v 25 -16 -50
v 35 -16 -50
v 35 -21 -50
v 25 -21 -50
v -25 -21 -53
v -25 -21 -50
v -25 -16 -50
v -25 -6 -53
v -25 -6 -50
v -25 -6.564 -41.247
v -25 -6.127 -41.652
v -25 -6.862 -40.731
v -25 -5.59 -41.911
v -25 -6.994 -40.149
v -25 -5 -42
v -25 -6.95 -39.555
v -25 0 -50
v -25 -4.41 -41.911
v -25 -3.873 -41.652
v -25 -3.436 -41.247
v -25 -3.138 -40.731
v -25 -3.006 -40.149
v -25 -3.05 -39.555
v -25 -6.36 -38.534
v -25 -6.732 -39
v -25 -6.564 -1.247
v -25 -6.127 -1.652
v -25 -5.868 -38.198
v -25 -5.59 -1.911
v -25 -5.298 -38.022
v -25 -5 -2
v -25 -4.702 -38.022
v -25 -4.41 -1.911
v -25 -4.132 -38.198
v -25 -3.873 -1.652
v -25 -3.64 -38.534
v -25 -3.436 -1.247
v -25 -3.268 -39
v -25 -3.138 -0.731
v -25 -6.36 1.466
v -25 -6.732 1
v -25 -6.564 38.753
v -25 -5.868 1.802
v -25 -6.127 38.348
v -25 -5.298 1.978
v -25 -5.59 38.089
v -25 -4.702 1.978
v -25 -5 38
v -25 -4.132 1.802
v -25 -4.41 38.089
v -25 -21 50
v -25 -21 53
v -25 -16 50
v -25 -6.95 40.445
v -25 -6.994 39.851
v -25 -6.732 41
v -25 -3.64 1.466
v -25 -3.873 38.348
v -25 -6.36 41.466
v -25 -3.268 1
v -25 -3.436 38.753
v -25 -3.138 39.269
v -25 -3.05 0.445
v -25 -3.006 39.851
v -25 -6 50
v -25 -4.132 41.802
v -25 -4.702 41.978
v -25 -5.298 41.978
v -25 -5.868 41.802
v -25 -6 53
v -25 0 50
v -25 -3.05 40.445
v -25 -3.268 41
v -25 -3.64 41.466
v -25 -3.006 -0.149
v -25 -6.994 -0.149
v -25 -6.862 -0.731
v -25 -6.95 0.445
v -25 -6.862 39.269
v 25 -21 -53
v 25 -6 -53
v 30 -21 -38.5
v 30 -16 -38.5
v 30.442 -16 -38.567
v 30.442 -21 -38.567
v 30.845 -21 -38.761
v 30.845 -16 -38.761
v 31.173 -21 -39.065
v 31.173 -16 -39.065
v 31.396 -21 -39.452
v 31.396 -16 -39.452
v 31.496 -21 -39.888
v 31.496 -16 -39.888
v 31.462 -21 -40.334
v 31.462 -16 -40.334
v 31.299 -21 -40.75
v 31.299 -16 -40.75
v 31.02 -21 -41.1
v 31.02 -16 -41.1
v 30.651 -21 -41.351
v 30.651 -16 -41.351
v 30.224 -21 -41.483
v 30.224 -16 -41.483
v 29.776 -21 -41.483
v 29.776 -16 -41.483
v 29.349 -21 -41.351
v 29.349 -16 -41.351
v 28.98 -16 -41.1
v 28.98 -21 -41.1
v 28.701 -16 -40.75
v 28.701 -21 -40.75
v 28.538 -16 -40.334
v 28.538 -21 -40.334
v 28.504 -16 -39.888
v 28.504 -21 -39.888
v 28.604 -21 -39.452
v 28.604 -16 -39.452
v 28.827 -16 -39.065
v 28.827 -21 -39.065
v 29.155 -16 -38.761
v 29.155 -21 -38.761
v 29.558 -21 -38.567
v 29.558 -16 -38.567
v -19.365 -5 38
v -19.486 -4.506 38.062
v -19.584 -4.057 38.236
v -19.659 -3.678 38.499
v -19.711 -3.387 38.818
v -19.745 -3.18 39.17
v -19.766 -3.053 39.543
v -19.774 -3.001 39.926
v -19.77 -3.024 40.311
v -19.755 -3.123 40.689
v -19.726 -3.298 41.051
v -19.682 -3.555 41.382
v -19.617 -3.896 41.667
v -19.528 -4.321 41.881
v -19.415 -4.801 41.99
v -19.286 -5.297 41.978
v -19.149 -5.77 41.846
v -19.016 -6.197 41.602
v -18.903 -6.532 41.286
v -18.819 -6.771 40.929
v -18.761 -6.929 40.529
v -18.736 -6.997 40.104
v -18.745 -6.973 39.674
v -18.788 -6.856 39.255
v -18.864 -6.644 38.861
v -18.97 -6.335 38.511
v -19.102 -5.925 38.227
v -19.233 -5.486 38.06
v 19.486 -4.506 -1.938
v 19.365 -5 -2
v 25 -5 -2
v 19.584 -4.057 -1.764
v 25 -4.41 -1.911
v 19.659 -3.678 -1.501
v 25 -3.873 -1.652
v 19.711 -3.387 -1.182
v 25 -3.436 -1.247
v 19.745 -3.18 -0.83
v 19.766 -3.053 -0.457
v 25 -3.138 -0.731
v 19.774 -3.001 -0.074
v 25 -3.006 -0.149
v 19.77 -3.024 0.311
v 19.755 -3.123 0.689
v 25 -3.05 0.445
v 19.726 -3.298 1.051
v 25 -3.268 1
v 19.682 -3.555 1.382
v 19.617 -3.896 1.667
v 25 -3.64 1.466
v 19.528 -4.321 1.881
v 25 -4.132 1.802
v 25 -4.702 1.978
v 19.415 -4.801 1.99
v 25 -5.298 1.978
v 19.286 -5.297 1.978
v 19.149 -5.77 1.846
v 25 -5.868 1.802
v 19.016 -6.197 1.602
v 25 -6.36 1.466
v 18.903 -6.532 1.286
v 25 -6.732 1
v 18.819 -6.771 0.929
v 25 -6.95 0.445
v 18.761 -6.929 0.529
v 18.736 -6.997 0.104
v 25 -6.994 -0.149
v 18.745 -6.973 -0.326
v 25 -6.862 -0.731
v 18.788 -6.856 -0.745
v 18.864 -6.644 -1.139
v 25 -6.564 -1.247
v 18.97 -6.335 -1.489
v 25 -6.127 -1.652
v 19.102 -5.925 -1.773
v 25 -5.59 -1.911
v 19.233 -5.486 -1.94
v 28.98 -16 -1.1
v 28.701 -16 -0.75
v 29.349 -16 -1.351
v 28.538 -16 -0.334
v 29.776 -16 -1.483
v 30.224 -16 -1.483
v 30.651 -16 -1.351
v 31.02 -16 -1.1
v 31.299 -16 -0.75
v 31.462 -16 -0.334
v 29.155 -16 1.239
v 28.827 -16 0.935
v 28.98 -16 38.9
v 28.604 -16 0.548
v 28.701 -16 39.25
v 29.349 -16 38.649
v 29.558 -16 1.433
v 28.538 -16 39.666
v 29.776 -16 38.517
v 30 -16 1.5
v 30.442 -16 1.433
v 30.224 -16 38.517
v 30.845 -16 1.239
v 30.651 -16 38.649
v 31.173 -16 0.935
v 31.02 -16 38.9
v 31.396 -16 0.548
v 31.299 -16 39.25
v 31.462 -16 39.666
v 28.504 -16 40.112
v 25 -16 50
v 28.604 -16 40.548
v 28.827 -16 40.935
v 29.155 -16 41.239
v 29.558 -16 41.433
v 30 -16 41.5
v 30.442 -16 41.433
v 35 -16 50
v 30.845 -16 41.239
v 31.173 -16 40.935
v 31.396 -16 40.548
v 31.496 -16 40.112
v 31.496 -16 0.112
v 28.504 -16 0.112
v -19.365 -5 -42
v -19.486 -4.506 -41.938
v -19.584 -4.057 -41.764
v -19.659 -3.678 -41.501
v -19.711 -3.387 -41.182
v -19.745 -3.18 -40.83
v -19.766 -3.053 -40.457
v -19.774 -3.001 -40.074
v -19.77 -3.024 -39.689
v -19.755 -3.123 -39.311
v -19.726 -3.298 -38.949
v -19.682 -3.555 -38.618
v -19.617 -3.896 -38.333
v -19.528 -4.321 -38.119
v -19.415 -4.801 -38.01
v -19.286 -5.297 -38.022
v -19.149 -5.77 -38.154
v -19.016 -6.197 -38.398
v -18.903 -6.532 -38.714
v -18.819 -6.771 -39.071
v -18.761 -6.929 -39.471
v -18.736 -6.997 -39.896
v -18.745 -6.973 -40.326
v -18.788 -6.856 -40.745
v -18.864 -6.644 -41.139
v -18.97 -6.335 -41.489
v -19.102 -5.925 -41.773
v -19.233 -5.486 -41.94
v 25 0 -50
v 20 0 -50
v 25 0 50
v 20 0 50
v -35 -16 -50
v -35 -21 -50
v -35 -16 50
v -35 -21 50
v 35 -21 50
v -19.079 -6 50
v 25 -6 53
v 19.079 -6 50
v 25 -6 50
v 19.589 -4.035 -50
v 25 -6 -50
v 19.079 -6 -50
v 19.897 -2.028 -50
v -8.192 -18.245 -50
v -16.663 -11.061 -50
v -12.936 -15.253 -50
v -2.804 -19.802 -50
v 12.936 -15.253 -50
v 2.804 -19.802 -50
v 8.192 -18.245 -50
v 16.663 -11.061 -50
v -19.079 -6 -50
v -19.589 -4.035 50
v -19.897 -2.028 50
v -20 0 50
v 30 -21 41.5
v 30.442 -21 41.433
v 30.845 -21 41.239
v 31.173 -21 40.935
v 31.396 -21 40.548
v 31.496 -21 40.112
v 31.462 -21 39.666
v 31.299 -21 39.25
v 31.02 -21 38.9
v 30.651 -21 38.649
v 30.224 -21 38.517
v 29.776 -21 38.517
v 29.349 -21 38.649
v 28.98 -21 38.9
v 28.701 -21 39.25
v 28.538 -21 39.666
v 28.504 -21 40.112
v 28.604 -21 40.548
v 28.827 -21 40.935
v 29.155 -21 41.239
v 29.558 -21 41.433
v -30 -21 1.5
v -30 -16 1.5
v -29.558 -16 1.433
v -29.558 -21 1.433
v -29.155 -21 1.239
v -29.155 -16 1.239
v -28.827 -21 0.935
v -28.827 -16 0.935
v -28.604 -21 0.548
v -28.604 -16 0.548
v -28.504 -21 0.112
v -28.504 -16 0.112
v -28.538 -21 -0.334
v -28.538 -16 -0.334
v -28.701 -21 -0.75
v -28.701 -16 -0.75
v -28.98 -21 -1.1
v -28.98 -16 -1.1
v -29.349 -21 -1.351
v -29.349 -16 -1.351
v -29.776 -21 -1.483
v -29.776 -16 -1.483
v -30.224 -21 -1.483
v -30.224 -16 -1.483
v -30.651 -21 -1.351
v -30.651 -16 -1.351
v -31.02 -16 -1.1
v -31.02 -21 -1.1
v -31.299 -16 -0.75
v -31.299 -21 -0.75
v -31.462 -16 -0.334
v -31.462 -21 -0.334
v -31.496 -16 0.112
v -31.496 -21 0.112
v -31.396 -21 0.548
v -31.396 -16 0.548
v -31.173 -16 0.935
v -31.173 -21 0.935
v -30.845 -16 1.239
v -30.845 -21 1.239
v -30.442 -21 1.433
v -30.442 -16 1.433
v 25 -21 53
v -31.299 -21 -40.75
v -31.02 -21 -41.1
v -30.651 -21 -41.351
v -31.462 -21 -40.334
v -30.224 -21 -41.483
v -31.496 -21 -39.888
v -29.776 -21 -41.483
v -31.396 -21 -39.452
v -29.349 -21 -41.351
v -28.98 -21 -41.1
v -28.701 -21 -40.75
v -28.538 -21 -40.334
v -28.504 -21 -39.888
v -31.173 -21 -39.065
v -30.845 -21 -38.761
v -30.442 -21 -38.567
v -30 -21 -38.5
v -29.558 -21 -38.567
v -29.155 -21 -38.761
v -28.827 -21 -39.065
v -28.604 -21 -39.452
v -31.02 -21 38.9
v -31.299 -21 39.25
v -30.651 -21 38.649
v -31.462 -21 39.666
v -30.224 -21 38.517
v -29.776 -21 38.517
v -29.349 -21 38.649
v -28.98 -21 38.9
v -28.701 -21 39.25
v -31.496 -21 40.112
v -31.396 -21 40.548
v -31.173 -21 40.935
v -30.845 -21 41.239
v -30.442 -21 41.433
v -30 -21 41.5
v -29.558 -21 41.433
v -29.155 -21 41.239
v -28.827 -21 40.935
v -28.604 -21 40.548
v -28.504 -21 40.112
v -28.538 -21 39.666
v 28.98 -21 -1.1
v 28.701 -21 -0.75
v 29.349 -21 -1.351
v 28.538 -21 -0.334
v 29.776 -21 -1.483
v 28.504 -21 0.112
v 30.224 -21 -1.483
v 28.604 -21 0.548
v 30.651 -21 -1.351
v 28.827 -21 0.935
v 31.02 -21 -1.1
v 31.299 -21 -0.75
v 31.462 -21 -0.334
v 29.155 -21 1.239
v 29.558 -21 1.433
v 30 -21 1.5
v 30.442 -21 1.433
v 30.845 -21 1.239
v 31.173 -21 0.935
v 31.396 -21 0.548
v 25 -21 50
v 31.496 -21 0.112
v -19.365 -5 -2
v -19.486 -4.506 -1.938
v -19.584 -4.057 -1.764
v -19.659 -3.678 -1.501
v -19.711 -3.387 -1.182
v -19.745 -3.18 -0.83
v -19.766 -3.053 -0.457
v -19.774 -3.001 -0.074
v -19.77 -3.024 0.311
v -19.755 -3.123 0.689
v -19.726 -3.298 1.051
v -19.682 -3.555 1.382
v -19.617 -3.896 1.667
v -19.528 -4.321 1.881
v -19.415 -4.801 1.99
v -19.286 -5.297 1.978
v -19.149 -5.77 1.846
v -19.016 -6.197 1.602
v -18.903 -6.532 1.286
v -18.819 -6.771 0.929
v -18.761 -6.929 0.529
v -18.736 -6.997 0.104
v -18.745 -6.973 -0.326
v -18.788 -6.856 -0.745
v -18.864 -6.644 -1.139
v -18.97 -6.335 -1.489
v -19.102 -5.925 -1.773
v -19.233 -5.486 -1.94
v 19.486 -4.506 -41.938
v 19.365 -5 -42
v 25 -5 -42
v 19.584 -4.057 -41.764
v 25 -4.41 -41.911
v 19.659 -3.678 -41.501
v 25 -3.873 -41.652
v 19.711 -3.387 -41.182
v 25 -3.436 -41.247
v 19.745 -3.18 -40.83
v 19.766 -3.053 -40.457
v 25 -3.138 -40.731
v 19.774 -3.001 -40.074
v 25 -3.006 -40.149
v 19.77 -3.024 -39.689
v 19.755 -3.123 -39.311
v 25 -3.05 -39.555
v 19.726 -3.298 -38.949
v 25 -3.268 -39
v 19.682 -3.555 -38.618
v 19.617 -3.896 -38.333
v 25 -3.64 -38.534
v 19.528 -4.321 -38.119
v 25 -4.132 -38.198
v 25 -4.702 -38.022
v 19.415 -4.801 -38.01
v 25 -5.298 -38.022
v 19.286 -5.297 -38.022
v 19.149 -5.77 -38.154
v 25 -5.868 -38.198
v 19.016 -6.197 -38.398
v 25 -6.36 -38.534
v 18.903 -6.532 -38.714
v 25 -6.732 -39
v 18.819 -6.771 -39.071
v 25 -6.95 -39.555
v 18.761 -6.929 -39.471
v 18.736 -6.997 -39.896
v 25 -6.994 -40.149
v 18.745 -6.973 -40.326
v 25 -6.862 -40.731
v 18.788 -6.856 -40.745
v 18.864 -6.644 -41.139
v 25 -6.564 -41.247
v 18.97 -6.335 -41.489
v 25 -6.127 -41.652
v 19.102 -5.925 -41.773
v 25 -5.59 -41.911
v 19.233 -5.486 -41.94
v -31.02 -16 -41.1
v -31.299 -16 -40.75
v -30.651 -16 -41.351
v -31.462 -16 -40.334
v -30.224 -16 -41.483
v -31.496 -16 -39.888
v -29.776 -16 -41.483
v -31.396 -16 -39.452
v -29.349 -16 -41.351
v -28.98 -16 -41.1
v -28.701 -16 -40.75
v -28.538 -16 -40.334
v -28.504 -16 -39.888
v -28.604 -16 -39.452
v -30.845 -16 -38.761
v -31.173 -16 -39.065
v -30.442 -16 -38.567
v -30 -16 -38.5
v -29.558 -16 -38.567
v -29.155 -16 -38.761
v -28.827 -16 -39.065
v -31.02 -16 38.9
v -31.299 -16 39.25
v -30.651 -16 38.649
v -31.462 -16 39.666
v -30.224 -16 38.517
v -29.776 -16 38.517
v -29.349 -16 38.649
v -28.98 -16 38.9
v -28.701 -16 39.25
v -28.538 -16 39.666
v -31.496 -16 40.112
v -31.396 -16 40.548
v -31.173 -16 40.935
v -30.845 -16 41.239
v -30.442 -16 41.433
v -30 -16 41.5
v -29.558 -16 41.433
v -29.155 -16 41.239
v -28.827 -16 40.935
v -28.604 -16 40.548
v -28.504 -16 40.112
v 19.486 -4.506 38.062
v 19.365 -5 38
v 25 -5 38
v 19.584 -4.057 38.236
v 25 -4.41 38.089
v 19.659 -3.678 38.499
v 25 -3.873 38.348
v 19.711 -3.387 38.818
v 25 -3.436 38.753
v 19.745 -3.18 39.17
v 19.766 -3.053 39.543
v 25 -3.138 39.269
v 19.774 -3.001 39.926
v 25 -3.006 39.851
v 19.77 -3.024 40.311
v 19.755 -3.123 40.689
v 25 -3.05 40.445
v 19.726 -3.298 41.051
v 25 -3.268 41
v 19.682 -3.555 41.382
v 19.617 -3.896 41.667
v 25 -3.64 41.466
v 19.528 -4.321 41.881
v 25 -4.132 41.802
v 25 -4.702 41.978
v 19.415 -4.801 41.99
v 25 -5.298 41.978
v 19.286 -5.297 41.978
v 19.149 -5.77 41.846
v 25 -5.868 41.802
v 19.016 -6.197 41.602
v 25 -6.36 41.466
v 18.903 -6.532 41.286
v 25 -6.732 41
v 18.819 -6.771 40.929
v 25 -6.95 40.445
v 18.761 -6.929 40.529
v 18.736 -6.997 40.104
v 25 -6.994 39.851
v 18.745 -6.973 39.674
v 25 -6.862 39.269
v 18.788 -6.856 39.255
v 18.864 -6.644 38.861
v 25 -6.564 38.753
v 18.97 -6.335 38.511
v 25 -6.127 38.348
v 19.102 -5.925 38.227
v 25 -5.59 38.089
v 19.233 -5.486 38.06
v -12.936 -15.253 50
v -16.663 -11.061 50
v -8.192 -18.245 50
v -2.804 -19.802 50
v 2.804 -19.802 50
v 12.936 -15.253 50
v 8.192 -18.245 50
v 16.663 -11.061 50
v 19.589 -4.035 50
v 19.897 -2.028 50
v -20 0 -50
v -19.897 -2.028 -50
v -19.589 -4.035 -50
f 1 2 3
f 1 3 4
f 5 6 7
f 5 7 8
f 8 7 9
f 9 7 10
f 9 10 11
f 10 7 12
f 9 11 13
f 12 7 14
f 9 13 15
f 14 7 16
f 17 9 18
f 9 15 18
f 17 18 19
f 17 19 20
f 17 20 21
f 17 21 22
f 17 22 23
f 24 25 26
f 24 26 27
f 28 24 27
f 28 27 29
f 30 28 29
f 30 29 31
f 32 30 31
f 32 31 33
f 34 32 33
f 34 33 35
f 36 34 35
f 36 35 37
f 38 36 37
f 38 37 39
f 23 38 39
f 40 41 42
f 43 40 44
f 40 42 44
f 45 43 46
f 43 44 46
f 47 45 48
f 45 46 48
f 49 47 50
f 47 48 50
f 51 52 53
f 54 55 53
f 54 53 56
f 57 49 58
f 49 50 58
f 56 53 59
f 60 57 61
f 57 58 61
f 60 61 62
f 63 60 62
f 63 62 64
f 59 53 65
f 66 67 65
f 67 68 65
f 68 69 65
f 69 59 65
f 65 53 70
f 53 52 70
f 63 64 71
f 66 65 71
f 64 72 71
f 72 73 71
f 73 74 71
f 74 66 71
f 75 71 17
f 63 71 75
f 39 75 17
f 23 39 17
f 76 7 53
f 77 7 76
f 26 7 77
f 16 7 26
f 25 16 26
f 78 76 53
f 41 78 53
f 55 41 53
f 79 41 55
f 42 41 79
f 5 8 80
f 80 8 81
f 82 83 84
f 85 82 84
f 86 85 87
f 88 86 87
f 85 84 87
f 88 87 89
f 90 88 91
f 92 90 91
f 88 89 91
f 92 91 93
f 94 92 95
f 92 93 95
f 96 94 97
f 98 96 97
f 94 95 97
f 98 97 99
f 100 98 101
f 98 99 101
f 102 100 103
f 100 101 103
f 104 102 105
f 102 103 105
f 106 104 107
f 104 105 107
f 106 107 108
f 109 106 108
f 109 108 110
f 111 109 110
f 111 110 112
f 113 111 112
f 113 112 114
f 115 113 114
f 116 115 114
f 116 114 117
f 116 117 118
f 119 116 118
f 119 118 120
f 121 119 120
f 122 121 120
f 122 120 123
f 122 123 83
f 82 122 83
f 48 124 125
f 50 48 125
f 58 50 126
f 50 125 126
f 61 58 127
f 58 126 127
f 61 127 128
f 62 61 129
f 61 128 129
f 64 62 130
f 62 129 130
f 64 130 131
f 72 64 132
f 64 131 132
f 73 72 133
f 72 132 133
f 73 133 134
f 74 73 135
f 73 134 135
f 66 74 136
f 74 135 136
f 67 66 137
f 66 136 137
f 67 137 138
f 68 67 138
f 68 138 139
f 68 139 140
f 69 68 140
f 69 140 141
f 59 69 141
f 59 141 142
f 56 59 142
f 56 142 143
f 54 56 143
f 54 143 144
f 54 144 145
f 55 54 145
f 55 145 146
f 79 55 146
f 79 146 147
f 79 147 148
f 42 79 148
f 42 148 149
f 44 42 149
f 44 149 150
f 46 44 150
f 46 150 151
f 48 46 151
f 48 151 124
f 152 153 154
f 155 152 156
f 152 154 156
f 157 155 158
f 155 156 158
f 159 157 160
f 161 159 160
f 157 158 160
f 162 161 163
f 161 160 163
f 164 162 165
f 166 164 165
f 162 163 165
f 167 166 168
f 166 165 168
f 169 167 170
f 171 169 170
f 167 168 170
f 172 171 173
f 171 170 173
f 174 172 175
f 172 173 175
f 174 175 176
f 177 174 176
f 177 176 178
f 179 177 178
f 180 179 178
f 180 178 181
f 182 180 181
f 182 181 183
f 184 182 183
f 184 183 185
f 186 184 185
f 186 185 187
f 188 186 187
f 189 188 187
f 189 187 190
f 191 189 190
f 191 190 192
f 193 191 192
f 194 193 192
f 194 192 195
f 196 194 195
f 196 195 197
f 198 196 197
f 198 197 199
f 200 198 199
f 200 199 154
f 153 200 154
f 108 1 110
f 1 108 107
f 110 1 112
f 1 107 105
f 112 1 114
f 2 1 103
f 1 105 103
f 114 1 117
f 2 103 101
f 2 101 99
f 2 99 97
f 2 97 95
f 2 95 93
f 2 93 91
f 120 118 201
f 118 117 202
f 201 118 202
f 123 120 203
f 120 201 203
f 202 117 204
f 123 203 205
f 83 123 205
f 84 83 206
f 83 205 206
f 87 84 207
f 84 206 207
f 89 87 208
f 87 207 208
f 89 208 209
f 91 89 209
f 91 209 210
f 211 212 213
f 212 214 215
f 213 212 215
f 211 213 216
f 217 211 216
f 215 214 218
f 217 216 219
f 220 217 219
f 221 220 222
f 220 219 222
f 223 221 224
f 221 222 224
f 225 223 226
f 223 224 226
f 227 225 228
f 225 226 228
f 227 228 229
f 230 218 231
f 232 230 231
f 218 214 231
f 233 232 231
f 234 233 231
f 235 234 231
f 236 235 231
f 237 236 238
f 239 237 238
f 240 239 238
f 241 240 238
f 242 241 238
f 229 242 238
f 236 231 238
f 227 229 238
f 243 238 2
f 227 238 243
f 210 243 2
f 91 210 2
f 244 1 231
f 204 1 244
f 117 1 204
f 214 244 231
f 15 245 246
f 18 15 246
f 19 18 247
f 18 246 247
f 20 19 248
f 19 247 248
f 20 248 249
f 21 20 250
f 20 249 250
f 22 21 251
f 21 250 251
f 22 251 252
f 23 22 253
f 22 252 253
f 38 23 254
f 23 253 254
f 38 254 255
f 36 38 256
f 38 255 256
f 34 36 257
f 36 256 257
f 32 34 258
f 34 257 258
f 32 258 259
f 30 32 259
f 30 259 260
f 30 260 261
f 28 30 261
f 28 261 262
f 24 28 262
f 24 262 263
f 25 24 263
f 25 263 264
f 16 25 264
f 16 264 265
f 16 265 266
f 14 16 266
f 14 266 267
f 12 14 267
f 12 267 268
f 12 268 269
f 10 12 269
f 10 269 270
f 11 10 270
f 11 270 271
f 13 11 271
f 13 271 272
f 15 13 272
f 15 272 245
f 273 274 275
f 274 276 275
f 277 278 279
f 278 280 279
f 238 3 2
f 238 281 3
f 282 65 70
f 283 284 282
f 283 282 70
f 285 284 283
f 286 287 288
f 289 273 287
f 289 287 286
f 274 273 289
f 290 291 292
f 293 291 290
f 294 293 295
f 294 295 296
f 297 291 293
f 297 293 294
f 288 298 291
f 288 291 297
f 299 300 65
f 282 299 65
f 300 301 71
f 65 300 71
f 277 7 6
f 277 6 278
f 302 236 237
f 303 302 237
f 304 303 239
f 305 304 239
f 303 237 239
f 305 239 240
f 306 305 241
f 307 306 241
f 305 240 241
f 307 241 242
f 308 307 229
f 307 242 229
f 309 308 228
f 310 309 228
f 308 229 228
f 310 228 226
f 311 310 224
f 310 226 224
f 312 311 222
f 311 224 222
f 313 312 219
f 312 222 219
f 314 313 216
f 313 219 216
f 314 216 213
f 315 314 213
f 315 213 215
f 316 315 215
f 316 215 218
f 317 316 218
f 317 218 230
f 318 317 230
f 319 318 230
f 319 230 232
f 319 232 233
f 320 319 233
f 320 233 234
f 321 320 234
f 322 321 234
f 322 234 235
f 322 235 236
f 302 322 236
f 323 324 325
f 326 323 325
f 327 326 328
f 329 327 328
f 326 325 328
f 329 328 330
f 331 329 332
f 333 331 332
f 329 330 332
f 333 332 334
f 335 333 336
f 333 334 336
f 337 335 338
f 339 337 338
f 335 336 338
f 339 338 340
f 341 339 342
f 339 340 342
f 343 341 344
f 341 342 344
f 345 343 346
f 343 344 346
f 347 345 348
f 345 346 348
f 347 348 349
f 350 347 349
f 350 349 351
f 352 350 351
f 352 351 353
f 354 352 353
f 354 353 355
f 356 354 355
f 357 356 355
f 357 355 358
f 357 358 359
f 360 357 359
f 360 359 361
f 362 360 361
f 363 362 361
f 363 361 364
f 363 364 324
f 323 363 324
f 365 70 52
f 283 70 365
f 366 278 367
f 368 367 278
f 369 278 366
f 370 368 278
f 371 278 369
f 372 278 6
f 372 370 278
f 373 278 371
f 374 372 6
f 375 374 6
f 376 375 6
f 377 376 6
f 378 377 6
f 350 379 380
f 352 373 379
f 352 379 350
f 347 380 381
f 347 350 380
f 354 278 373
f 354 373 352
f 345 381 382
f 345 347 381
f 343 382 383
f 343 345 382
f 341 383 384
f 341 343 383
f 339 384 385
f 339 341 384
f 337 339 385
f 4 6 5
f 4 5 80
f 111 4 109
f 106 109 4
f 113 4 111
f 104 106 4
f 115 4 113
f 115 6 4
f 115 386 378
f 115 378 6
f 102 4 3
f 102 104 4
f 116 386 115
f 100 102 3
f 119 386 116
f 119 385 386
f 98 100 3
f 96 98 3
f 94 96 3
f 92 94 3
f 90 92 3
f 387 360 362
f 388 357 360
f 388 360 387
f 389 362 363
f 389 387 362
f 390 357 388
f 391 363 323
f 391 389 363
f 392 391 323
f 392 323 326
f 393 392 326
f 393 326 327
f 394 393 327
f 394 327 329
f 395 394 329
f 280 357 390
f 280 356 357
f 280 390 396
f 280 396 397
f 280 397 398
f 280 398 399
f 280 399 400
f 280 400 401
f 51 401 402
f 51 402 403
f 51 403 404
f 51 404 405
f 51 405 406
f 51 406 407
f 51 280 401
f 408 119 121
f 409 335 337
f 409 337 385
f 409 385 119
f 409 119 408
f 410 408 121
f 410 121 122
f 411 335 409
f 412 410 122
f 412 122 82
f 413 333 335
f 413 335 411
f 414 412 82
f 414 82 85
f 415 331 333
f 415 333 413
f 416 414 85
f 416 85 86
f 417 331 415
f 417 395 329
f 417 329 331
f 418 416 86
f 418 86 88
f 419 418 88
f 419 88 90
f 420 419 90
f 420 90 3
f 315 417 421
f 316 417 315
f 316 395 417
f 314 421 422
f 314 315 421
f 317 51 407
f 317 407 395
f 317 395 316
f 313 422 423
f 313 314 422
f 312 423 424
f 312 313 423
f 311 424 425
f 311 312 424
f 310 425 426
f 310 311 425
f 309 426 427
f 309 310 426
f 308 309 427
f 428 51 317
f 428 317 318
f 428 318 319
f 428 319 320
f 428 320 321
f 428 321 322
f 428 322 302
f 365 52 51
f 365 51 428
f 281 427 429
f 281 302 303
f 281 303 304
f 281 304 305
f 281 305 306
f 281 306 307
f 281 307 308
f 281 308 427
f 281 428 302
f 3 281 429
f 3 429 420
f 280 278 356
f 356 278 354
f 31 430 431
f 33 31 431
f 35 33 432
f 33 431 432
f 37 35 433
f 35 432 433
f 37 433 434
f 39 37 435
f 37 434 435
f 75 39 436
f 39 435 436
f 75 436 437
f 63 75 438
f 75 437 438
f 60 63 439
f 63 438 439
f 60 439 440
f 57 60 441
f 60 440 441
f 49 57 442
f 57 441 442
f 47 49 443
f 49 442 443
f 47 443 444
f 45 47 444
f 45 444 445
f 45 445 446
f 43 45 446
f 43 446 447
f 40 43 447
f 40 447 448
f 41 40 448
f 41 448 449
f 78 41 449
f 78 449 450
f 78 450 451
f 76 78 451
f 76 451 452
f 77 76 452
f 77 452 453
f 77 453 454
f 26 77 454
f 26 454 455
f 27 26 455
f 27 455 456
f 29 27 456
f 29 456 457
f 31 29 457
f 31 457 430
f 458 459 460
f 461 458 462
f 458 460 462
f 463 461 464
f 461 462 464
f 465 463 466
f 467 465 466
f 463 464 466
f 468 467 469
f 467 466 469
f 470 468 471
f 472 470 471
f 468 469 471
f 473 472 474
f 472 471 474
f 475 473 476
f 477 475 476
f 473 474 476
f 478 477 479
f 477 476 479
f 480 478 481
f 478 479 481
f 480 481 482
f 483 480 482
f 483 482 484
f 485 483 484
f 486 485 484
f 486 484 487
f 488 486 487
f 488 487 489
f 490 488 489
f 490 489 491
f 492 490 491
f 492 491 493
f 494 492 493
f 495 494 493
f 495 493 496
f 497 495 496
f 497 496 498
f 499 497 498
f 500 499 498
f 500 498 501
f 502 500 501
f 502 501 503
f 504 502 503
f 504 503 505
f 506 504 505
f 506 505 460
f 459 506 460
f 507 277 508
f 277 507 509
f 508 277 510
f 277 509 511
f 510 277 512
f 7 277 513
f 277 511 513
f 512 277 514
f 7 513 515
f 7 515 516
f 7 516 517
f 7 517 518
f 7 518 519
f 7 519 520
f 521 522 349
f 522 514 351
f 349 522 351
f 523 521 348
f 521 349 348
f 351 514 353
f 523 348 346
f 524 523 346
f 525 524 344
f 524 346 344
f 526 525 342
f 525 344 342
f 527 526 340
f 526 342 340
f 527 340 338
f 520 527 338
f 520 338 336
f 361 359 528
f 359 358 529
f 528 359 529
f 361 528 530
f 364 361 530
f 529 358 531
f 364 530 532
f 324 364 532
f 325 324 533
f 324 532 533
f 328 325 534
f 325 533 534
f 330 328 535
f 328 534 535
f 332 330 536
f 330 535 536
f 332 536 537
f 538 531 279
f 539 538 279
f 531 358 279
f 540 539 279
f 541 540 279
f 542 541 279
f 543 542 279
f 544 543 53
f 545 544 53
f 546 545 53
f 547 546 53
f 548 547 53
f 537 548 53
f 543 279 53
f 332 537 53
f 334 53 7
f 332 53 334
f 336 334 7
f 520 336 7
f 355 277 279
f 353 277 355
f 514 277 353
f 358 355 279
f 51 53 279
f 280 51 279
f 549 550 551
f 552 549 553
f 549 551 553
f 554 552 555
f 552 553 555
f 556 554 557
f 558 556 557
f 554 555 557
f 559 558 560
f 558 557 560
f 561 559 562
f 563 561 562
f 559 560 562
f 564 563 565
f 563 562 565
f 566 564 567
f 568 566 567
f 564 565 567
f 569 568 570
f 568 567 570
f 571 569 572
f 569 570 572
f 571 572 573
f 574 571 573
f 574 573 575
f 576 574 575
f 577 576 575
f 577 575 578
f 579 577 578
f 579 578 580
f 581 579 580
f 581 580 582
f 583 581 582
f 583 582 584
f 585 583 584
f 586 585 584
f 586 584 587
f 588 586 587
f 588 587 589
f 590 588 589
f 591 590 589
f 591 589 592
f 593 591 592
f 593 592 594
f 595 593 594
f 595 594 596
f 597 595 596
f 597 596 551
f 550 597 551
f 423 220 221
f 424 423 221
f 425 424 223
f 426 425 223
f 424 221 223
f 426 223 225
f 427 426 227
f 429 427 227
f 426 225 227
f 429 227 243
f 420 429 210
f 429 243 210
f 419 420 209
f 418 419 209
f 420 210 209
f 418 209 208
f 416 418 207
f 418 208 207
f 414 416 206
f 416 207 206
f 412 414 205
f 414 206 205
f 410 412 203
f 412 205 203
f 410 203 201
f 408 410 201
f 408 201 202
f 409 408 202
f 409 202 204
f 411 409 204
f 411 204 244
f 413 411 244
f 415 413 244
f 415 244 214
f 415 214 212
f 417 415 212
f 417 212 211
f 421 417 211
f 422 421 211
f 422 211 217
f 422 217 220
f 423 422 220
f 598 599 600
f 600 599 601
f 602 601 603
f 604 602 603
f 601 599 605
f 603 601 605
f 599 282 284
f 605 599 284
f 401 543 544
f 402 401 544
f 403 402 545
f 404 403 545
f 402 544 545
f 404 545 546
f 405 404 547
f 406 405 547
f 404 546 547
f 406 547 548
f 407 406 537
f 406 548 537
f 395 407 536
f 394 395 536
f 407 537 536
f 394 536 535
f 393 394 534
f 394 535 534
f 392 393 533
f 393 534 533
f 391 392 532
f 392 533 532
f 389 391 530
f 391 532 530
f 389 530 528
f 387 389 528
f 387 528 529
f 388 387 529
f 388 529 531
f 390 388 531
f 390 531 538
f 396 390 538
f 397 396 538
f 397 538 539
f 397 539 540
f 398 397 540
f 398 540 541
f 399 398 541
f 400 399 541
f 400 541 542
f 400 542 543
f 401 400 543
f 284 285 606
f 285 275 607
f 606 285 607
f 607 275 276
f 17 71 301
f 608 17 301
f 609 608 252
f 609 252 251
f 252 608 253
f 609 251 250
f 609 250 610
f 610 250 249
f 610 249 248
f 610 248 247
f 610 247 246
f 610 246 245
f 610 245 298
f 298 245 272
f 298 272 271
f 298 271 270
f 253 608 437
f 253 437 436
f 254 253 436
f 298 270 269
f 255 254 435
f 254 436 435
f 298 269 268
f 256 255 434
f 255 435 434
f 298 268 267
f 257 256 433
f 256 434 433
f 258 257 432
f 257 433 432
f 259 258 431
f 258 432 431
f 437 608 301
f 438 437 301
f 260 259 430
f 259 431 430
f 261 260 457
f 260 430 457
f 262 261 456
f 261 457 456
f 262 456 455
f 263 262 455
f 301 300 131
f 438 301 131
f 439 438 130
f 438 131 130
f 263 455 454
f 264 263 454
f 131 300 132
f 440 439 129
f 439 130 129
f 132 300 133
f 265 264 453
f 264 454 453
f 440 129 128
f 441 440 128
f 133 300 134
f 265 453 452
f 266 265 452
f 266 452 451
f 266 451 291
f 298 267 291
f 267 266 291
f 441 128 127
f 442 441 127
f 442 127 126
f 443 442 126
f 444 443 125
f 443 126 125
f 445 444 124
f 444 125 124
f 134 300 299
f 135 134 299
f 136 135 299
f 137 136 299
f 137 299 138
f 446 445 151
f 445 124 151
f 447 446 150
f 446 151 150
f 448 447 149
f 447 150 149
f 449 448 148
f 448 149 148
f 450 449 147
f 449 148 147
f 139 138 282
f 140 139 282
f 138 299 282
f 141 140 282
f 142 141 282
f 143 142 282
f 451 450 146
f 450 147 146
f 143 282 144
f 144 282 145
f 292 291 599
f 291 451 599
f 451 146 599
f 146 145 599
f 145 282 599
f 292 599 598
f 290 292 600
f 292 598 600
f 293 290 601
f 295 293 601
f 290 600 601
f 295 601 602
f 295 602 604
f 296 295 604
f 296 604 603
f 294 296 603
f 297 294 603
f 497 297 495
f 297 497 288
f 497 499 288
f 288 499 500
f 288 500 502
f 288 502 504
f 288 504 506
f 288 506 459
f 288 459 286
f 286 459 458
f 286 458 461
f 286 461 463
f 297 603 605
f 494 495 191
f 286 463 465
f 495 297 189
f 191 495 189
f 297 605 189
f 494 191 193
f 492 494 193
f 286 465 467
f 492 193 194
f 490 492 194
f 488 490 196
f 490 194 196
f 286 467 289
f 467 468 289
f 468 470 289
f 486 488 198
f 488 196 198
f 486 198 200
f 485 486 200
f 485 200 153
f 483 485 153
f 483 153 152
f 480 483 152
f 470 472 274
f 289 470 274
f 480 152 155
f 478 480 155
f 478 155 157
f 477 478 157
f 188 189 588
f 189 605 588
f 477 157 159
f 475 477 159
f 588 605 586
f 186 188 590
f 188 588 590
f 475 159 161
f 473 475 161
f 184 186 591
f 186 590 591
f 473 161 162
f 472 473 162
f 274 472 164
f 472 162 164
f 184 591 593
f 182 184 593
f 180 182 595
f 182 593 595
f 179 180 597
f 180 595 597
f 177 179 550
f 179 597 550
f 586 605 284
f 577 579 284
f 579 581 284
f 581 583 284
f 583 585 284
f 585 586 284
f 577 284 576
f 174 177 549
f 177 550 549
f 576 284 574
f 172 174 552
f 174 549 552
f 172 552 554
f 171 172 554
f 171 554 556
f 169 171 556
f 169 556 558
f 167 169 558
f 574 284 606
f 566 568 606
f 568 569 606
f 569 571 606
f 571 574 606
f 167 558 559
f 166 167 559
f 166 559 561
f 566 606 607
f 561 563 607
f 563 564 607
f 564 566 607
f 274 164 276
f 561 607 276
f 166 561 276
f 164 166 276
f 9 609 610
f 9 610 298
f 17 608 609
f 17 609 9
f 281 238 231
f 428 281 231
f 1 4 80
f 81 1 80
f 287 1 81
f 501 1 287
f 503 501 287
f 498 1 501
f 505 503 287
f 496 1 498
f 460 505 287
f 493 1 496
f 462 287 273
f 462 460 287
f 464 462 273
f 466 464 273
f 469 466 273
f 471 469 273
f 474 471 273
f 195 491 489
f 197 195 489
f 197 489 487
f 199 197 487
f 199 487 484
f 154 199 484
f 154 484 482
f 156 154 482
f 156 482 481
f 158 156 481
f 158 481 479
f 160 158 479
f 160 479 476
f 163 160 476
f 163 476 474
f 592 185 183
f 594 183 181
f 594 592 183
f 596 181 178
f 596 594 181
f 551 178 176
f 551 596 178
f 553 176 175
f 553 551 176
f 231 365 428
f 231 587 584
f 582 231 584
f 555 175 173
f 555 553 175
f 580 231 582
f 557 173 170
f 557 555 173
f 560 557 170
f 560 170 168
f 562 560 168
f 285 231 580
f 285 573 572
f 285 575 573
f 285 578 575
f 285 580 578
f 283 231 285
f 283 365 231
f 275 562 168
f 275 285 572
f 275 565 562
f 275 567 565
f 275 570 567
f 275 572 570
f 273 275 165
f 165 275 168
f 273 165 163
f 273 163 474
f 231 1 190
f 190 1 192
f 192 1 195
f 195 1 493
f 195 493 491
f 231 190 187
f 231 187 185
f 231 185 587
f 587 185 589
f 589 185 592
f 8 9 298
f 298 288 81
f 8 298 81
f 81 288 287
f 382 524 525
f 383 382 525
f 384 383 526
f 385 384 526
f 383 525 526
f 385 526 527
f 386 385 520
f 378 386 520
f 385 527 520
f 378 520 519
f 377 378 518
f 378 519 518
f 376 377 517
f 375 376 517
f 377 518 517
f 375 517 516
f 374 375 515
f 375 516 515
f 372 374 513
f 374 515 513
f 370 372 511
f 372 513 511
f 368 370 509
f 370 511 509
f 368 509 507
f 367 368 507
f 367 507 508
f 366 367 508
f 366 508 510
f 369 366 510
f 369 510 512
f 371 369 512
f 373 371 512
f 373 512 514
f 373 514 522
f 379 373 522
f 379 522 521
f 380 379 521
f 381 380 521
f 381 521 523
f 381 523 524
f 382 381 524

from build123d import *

# Parameters (mm, degrees)
SKETCH1_W           = 10
SKETCH1_H           = 5
BOSS_EXTRUDE2_DEPTH = 50
SKETCH2_R           = 1.5
CUT_EXTRUDE1_DEPTH  = 100
SKETCH5_R           = 2
CUT_EXTRUDE3_DEPTH  = 100
SKETCH6_W           = 50
SKETCH6_H           = 15
BOSS_EXTRUDE3_DEPTH = 3


with BuildPart() as part:
    # Sketch1 → Boss-Extrude2 (new, symmetric)
    with BuildSketch(Plane.XY):
        with BuildLine():
            ThreePointArc((-20, 0), (0, -20), (20, 0))
            Line((20, 0), (25, 0))
            Line((25, 0), (25, -21))
            Line((25, -21), (-25, -21))
            Line((-25, -21), (-25, 0))
            Line((-25, 0), (-20, 0))
        make_face()
        with Locations((-30, -18.5)):
            Rectangle(SKETCH1_W, SKETCH1_H)
        with Locations((30, -18.5)):
            Rectangle(SKETCH1_W, SKETCH1_H)
    extrude(amount=BOSS_EXTRUDE2_DEPTH, both=True)

    # Sketch2 → Cut-Extrude1 (cut)
    with BuildSketch(Plane(origin=(0, -16, 0), x_dir=(1, 0, 0), z_dir=(0, 1, 0))):
        with Locations(Location((-30, 40, 0), (0, 0, 270))):
            Circle(SKETCH2_R)
        with Locations(Location((-30, 0, 0), (0, 0, 270))):
            Circle(SKETCH2_R)
        with Locations(Location((-30, -40, 0), (0, 0, 270))):
            Circle(SKETCH2_R)
        with Locations(Location((30, 40, 0), (0, 0, 270))):
            Circle(SKETCH2_R)
        with Locations(Location((30, 0, 0), (0, 0, 270))):
            Circle(SKETCH2_R)
        with Locations(Location((30, -40, 0), (0, 0, 270))):
            Circle(SKETCH2_R)
    extrude(amount=-CUT_EXTRUDE1_DEPTH, mode=Mode.SUBTRACT)

    # Sketch5 → Cut-Extrude3 (cut)
    with BuildSketch(Plane(origin=(25, 0, 0), x_dir=(0, 0, -1), z_dir=(1, 0, 0))):
        with Locations((-40, -5)):
            Circle(SKETCH5_R)
        with Locations((0, -5)):
            Circle(SKETCH5_R)
        with Locations((40, -5)):
            Circle(SKETCH5_R)
    extrude(amount=-CUT_EXTRUDE3_DEPTH, mode=Mode.SUBTRACT)

    # Sketch6 → Boss-Extrude3 (add)
    with BuildSketch(Plane.XY.offset(50)):
        with Locations((0, -13.5)):
            Rectangle(SKETCH6_W, SKETCH6_H)
    boss_extrude3 = extrude(amount=BOSS_EXTRUDE3_DEPTH)

    # Mirror2: Boss-Extrude3 across plane
    add(boss_extrude3.mirror(Plane.XY))


solid = part.part
